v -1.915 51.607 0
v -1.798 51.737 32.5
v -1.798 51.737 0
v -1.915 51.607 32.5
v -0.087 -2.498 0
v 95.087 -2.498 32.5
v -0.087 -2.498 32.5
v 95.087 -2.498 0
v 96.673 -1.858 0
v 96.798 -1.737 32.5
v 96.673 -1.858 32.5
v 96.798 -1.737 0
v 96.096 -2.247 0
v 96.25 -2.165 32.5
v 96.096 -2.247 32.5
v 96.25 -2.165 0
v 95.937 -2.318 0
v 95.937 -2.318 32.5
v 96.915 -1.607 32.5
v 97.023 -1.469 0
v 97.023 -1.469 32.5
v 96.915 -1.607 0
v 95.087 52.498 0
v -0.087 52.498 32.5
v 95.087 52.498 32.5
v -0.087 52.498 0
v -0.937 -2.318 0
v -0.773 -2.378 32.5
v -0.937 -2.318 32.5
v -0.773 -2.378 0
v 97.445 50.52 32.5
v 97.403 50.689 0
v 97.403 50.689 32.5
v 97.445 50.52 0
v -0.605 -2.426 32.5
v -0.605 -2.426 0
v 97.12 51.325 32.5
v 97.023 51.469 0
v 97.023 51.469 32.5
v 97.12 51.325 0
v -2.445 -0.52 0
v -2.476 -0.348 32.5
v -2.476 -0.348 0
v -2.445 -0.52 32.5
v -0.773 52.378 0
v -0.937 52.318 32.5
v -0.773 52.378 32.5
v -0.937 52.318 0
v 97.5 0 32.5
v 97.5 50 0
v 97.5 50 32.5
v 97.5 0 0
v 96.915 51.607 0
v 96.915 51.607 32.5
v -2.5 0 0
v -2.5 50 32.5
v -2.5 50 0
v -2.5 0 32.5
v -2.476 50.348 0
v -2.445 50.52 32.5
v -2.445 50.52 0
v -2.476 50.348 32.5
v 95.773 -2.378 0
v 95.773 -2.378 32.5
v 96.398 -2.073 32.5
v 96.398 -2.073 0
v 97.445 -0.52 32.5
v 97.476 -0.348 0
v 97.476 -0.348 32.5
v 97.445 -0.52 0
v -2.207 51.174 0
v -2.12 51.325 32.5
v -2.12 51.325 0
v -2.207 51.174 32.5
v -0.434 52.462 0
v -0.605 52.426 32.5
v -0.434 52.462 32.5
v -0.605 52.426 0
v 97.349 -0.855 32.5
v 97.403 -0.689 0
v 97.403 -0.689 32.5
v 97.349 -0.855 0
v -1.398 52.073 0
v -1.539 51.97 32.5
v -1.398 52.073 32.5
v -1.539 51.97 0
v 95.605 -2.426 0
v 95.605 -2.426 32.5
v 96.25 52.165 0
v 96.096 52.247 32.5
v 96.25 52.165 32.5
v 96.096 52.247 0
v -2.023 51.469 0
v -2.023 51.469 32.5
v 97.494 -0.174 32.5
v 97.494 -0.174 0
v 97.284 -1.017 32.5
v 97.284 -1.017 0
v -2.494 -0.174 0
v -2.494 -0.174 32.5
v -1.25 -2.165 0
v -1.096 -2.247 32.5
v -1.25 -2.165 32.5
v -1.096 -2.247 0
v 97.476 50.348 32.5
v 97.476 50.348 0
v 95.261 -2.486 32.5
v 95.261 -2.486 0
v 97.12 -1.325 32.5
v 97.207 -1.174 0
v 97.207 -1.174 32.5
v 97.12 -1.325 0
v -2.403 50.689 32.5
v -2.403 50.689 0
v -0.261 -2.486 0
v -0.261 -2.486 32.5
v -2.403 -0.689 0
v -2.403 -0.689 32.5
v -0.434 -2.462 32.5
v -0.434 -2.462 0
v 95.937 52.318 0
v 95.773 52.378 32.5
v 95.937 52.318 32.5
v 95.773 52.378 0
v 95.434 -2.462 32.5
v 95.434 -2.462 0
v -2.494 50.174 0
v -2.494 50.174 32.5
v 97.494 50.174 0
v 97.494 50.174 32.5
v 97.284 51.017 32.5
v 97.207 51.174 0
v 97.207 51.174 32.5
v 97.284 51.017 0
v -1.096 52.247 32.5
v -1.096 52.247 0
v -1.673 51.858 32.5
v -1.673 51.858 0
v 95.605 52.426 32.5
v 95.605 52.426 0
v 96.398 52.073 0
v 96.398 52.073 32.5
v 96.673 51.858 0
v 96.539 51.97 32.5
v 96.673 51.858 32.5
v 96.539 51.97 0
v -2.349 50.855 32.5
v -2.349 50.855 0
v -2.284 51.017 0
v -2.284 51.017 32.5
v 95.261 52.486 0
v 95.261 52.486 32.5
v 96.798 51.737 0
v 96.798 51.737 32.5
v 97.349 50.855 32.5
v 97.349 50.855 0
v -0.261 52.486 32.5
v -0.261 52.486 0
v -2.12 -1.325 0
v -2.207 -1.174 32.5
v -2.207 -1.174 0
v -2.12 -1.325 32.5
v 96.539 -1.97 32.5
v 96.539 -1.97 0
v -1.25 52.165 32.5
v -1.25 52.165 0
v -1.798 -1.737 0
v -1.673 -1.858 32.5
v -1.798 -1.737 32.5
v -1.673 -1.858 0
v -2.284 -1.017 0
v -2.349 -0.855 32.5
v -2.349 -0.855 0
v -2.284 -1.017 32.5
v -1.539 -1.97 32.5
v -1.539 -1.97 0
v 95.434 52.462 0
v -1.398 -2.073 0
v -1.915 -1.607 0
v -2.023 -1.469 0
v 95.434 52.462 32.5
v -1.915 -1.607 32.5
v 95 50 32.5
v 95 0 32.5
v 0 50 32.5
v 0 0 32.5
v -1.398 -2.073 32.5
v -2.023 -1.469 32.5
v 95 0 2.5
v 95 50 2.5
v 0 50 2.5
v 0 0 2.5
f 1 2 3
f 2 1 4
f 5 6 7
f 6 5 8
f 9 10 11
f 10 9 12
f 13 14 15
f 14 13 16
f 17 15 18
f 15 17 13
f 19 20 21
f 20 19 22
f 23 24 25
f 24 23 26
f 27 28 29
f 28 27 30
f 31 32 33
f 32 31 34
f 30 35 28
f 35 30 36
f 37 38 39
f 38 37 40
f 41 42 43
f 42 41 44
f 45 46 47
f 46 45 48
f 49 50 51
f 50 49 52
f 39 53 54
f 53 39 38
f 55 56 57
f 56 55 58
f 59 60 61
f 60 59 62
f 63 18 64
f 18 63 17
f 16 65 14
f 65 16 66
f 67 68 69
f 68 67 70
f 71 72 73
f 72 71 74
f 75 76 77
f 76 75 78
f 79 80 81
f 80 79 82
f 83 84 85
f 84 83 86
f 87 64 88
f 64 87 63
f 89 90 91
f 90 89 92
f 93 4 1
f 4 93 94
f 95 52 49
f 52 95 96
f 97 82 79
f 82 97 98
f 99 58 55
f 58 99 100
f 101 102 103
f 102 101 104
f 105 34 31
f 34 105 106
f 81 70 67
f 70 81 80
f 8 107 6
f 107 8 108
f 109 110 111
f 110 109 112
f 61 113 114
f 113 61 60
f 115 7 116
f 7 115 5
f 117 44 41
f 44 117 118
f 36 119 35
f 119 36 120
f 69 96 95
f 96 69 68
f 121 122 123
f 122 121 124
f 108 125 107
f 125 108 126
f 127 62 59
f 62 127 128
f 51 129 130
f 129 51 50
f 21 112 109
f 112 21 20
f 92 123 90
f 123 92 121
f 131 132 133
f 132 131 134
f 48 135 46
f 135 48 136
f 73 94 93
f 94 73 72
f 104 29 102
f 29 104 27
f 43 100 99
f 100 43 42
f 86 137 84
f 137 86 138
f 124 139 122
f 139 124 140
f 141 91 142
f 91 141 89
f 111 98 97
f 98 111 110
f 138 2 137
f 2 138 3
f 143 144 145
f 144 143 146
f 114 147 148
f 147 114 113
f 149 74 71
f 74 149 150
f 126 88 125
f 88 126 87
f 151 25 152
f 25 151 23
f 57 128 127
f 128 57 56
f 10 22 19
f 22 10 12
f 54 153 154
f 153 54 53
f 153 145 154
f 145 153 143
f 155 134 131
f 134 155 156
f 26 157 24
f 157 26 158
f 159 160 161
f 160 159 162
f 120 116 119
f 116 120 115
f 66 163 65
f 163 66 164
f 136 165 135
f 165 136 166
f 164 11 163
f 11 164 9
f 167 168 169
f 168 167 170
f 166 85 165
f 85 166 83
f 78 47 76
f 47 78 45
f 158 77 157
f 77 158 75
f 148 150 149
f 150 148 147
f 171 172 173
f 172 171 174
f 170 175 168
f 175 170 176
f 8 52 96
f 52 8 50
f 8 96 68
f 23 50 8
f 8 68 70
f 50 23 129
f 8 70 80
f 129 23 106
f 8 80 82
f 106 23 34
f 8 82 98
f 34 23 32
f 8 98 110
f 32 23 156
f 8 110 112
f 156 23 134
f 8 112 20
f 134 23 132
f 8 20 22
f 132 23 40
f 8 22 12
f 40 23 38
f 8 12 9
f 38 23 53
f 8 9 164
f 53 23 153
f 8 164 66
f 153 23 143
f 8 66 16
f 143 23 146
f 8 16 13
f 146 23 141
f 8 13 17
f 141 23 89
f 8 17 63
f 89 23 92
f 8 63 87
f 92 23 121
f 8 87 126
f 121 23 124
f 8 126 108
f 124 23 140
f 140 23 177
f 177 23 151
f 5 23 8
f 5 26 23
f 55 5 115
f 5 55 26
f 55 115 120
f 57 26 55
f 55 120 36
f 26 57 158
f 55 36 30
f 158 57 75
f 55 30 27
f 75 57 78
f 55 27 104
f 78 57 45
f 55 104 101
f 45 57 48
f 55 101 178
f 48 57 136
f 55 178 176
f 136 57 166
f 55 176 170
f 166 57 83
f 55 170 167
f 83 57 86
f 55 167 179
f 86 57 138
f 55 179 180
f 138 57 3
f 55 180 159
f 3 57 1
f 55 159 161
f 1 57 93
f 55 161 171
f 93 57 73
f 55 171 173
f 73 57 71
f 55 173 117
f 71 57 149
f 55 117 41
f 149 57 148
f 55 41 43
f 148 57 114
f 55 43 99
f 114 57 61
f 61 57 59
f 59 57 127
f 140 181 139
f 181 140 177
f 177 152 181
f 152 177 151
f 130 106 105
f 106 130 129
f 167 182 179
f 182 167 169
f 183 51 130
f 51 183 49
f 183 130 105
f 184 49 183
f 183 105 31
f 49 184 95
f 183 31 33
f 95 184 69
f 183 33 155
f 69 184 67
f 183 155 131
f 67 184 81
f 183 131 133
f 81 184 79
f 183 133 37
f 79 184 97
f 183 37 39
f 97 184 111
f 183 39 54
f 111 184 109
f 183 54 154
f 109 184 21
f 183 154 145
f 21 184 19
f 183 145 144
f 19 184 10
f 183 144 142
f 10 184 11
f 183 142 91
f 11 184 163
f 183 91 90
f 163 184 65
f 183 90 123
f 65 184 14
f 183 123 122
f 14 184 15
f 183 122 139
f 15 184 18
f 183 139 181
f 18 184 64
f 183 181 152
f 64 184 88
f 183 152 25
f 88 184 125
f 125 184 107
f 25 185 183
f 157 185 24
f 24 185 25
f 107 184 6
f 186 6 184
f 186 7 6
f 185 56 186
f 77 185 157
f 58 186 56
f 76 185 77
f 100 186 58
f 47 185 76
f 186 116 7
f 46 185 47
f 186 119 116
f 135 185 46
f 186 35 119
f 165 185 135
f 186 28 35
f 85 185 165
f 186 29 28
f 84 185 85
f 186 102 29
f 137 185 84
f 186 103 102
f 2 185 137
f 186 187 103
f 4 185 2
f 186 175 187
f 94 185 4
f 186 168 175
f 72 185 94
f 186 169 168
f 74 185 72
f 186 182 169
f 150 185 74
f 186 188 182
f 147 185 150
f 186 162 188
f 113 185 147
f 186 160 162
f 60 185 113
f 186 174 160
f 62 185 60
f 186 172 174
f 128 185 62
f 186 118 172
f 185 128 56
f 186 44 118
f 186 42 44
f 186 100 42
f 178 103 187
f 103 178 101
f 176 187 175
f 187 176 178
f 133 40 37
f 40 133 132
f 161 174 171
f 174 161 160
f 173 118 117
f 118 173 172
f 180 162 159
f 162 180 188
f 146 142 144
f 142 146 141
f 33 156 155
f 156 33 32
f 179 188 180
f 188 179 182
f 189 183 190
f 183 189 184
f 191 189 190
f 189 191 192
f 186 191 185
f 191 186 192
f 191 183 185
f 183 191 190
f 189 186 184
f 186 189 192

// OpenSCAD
$fn = 90;
eps = 0.01;

t = 5;

a = 95;
b = 50;
h = 30+t/2;

difference()
{
    hull()
    {
        translate([0,0,0]) cylinder(h=h, d=t);
        translate([a,0,0]) cylinder(h=h, d=t);
        translate([a,b,0]) cylinder(h=h, d=t);
        translate([0,b,0]) cylinder(h=h, d=t);
    }
    
    translate([0,0,t/2]) cube([a,b,h]);
}
